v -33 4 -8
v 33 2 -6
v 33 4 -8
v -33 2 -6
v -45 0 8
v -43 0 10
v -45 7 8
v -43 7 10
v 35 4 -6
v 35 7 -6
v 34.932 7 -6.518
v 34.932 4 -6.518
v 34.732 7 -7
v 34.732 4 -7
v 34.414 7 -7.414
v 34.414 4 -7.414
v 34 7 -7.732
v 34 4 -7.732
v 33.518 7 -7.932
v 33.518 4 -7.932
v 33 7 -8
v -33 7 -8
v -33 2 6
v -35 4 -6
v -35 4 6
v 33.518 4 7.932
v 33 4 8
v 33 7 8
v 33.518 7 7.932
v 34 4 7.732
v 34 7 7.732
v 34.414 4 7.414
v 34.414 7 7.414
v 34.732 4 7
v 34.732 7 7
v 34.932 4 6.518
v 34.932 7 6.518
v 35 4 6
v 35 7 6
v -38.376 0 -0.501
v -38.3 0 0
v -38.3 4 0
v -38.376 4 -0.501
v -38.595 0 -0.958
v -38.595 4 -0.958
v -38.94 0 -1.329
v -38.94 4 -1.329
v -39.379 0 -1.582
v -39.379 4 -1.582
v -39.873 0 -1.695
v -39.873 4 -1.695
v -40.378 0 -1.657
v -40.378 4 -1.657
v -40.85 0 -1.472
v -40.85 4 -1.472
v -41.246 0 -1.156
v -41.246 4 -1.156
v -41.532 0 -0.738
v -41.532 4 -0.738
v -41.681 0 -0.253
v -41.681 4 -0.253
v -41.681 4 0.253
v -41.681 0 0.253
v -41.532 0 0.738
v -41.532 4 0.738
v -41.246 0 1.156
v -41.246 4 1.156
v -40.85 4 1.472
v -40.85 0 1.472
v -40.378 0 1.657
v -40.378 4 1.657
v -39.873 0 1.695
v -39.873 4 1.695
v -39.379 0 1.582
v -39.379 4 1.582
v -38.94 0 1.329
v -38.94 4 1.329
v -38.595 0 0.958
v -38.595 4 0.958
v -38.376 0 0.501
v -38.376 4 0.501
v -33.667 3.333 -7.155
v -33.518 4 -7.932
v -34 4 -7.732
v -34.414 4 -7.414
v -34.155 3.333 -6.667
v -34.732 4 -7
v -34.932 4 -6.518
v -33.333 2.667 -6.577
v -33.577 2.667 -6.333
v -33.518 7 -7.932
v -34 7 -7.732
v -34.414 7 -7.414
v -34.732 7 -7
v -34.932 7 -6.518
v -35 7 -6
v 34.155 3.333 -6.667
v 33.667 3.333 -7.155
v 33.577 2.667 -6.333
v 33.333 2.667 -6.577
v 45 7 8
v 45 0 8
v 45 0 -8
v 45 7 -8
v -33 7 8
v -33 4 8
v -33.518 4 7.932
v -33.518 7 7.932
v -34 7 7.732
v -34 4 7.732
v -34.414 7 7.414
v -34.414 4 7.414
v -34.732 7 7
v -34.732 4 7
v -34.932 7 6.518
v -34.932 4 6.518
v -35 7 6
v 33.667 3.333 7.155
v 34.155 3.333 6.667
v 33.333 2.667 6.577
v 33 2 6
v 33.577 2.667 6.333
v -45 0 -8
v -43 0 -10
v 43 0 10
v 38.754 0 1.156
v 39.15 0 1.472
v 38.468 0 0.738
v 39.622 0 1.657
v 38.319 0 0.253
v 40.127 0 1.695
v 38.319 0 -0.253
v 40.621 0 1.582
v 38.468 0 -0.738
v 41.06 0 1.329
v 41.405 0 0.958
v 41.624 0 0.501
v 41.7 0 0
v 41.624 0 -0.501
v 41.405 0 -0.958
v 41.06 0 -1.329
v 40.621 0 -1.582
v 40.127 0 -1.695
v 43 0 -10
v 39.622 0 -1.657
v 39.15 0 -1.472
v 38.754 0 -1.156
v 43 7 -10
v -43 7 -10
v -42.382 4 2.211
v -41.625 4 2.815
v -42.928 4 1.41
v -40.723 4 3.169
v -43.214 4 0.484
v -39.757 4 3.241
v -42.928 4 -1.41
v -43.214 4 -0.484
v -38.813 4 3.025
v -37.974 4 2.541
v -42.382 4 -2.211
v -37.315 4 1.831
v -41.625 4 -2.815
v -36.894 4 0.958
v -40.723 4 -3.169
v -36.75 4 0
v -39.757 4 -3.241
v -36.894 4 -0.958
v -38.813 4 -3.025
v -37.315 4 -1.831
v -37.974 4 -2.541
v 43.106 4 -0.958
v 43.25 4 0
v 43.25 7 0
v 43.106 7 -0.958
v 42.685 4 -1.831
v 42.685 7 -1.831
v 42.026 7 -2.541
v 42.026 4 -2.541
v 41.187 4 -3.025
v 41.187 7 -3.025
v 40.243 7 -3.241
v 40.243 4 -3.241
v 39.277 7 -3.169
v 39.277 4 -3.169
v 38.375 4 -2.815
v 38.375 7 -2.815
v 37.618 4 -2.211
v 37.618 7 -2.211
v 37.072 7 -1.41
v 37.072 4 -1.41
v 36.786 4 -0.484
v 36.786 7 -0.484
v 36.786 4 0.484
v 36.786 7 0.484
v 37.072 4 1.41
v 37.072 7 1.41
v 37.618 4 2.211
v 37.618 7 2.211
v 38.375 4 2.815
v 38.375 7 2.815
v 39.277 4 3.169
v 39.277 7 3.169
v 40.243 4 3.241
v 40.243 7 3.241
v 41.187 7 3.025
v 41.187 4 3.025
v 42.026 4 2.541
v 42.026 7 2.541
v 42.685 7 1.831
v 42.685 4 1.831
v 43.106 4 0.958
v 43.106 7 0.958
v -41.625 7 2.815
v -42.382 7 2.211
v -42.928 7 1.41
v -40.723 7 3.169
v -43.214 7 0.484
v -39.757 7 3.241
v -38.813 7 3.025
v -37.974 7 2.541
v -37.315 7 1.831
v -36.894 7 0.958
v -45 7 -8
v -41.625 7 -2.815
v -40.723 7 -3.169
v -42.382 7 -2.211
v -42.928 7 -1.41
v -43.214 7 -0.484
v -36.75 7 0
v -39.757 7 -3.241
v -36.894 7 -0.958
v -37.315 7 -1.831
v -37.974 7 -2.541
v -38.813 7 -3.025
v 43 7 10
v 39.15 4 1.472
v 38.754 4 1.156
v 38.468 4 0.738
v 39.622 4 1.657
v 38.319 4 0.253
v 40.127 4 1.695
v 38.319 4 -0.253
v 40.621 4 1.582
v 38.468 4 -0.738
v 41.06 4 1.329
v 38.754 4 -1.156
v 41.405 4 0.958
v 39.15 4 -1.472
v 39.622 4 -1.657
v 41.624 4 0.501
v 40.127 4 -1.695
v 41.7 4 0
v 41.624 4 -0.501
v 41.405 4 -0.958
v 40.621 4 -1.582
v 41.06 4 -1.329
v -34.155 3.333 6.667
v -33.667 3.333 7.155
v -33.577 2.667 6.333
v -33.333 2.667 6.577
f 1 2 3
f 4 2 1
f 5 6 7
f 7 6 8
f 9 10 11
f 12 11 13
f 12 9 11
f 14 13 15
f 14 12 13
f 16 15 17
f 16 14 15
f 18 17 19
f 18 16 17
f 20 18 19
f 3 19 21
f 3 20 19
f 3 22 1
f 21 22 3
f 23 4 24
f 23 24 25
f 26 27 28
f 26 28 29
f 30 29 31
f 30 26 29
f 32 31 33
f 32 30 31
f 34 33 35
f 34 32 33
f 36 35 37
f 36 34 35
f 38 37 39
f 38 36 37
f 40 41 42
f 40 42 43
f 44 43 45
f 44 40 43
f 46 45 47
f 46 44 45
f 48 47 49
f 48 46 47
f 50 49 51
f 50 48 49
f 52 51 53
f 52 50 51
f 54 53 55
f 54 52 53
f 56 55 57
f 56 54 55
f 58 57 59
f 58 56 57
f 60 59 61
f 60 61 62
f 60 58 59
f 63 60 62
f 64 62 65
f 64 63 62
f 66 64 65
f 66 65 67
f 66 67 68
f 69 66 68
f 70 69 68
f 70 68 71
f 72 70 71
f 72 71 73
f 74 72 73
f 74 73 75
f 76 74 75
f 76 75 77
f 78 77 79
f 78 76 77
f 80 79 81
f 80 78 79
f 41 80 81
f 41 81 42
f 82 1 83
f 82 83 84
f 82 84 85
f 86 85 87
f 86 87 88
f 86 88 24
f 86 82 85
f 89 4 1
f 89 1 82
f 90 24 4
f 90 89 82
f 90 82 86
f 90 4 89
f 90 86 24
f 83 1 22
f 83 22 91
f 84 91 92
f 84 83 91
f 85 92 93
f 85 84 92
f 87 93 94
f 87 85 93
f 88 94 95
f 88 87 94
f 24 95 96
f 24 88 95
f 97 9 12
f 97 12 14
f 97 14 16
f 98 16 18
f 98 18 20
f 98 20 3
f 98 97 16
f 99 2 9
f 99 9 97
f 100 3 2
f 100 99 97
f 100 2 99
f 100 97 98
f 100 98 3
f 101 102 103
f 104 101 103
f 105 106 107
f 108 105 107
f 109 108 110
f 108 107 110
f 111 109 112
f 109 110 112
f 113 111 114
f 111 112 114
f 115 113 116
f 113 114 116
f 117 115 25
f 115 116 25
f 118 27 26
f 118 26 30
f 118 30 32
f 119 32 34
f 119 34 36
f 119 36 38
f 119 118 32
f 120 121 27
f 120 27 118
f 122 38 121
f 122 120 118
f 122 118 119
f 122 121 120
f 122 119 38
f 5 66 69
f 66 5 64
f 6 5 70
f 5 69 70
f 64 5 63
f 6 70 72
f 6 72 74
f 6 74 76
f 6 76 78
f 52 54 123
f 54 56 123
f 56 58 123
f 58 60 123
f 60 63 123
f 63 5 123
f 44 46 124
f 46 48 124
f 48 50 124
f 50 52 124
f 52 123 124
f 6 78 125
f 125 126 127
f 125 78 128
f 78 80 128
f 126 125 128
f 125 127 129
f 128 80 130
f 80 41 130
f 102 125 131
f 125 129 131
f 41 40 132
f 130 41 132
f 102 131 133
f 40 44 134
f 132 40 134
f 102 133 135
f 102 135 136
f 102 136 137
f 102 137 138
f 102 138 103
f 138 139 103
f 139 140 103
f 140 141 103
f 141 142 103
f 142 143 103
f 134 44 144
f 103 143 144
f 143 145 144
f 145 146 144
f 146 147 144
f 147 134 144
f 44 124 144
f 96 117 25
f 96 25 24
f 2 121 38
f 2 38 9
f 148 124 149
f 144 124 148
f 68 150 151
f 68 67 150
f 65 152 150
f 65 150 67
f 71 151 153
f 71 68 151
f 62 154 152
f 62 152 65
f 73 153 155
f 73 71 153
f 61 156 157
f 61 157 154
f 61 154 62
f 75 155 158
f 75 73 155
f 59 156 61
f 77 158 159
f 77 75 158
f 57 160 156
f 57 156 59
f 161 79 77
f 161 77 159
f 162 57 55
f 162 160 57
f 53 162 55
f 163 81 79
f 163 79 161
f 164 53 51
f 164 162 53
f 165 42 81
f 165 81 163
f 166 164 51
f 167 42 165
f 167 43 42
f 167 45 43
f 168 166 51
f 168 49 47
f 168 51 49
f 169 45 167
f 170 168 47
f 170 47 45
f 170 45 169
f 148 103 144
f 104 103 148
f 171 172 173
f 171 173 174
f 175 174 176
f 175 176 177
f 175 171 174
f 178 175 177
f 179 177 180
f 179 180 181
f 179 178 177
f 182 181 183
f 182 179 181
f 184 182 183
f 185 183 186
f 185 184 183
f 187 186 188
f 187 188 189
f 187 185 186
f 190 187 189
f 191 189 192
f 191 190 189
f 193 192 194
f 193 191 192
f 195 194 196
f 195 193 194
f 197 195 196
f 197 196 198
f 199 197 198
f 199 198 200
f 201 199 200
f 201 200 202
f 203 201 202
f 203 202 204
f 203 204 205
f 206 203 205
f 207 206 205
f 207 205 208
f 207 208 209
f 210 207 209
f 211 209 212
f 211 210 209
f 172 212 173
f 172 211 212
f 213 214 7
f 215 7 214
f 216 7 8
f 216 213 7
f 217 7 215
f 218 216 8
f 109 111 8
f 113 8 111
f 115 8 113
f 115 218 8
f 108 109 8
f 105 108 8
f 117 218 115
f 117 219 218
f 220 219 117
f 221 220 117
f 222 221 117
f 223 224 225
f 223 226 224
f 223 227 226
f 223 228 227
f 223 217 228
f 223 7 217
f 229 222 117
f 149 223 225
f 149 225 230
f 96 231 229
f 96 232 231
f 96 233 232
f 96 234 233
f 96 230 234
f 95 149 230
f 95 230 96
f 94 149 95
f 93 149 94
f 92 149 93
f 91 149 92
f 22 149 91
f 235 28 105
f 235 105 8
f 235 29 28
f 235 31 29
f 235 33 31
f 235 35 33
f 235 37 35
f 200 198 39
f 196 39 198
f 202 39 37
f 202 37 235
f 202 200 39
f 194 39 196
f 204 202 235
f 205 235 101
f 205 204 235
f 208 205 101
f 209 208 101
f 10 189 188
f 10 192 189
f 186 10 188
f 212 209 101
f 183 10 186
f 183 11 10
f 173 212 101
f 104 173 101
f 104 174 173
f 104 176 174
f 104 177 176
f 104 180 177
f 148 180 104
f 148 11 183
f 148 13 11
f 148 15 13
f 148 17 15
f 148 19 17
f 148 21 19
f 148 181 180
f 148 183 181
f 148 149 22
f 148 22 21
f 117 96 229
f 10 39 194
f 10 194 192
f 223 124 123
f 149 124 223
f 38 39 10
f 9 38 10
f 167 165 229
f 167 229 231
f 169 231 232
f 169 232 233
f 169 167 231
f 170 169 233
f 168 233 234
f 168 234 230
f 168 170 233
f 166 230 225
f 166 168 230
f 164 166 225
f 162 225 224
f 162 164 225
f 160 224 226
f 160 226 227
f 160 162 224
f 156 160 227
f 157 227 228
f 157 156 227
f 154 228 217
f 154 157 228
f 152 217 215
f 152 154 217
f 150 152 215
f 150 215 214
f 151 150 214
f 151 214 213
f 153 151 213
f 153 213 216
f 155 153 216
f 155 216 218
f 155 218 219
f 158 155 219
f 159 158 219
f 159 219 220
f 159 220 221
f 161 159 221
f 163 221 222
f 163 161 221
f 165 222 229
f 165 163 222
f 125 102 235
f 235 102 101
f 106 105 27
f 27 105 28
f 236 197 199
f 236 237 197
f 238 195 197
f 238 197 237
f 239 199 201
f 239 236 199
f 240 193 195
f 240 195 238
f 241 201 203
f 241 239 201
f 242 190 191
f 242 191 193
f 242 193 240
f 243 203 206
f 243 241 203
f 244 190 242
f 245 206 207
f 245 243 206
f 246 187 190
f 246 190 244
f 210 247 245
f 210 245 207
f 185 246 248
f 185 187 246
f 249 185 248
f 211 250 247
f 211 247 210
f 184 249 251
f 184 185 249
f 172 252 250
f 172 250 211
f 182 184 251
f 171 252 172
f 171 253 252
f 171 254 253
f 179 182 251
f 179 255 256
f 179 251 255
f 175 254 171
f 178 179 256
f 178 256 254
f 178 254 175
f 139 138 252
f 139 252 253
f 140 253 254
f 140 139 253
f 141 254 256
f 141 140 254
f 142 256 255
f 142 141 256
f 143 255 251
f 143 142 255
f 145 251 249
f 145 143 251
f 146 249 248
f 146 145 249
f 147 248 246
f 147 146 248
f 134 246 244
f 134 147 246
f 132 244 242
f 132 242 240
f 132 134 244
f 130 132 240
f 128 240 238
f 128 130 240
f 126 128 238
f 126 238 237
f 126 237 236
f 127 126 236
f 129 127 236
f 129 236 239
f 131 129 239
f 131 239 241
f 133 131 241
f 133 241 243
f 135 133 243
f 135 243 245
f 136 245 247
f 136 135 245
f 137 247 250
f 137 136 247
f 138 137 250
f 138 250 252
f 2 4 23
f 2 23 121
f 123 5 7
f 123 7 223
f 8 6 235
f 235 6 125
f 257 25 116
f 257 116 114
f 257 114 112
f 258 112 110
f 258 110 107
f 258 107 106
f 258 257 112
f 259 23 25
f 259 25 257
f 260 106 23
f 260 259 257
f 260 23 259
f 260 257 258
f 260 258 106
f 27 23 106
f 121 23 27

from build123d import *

# Parameters (mm, degrees)
SKETCH1_W                      = 90
SKETCH1_H                      = 20
BOSS_EXTRUDE1_DEPTH            = 7
CBORE_START                    = 4
CBORE_FOR_M3_SHCS1_OUTLINE_R   = 3.25
CBORE_FOR_M3_SHCS1_DEPTH       = 3
CBORE_FOR_M3_SHCS1_2_OUTLINE_R = 1.7
CBORE_FOR_M3_SHCS1_2_DEPTH     = 4
SKETCH4_W                      = 70
SKETCH4_H                      = 16
CUT_EXTRUDE1_DEPTH             = 5
CHAMFER1_SIZE                  = 2
FILLET1_R                      = 2
CHAMFER2_SIZE                  = 2


# Read off the part's stored shape, not the designer's step: CBORE for M3 SHCS1
with BuildPart() as part:
    # Sketch1 → Boss-Extrude1 (new body)
    with BuildSketch(Plane(origin=(0, 0, 0), x_dir=(1, 0, 0), z_dir=(0, 1, 0))):
        Rectangle(SKETCH1_W, SKETCH1_H)
    extrude(amount=BOSS_EXTRUDE1_DEPTH)

    # CBORE for M3 SHCS1 outline → CBORE for M3 SHCS1 (cut)
    with BuildSketch(Plane(origin=(0, 0, 0), x_dir=(1, 0, 0), z_dir=(0, 1, 0)).offset(CBORE_START)):
        with Locations((-40, 0)):
            Circle(CBORE_FOR_M3_SHCS1_OUTLINE_R)
        with Locations((40, 0)):
            Circle(CBORE_FOR_M3_SHCS1_OUTLINE_R)
    extrude(amount=CBORE_FOR_M3_SHCS1_DEPTH, mode=Mode.SUBTRACT)

    # CBORE for M3 SHCS1 2 outline → CBORE for M3 SHCS1 2 (cut)
    with BuildSketch(Plane(origin=(0, 0, 0), x_dir=(1, 0, 0), z_dir=(0, 1, 0))):
        with Locations((-40, 0)):
            Circle(CBORE_FOR_M3_SHCS1_2_OUTLINE_R)
        with Locations((40, 0)):
            Circle(CBORE_FOR_M3_SHCS1_2_OUTLINE_R)
    extrude(amount=CBORE_FOR_M3_SHCS1_2_DEPTH, mode=Mode.SUBTRACT)

    # Sketch4 → Cut-Extrude1 (cut)
    with BuildSketch(Plane(origin=(0, 7, 0), x_dir=(1, 0, 0), z_dir=(0, 1, 0))):
        Rectangle(SKETCH4_W, SKETCH4_H)
    extrude(amount=-CUT_EXTRUDE1_DEPTH, mode=Mode.SUBTRACT)

    # Chamfer1
    chamfer1_edges = [part.edges().sort_by_distance(p)[0] for p in [
        (45, 3.5, 10),
        (-45, 3.5, 10),
        (-45, 3.5, -10),
        (45, 3.5, -10),
    ]]
    chamfer(chamfer1_edges, length=CHAMFER1_SIZE)

    # Fillet1
    fillet1_edges = [part.edges().sort_by_distance(p)[0] for p in [
        (-35, 4.5, -8),
        (-35, 4.5, 8),
        (35, 4.5, 8),
        (35, 4.5, -8),
    ]]
    fillet(fillet1_edges, radius=FILLET1_R)

    # Chamfer2
    chamfer2_edges = [part.edges().sort_by_distance(p)[0] for p in [
        (35, 2, 0),
        (0, 2, 8),
        (0, 2, -8),
        (-35, 2, 0),
        (-34.414213562, 2, 7.414213562),
        (-34.414213562, 2, -7.414213562),
        (34.414213562, 2, -7.414213562),
        (34.414213562, 2, 7.414213562),
    ]]
    chamfer(chamfer2_edges, length=CHAMFER2_SIZE)


solid = part.part
